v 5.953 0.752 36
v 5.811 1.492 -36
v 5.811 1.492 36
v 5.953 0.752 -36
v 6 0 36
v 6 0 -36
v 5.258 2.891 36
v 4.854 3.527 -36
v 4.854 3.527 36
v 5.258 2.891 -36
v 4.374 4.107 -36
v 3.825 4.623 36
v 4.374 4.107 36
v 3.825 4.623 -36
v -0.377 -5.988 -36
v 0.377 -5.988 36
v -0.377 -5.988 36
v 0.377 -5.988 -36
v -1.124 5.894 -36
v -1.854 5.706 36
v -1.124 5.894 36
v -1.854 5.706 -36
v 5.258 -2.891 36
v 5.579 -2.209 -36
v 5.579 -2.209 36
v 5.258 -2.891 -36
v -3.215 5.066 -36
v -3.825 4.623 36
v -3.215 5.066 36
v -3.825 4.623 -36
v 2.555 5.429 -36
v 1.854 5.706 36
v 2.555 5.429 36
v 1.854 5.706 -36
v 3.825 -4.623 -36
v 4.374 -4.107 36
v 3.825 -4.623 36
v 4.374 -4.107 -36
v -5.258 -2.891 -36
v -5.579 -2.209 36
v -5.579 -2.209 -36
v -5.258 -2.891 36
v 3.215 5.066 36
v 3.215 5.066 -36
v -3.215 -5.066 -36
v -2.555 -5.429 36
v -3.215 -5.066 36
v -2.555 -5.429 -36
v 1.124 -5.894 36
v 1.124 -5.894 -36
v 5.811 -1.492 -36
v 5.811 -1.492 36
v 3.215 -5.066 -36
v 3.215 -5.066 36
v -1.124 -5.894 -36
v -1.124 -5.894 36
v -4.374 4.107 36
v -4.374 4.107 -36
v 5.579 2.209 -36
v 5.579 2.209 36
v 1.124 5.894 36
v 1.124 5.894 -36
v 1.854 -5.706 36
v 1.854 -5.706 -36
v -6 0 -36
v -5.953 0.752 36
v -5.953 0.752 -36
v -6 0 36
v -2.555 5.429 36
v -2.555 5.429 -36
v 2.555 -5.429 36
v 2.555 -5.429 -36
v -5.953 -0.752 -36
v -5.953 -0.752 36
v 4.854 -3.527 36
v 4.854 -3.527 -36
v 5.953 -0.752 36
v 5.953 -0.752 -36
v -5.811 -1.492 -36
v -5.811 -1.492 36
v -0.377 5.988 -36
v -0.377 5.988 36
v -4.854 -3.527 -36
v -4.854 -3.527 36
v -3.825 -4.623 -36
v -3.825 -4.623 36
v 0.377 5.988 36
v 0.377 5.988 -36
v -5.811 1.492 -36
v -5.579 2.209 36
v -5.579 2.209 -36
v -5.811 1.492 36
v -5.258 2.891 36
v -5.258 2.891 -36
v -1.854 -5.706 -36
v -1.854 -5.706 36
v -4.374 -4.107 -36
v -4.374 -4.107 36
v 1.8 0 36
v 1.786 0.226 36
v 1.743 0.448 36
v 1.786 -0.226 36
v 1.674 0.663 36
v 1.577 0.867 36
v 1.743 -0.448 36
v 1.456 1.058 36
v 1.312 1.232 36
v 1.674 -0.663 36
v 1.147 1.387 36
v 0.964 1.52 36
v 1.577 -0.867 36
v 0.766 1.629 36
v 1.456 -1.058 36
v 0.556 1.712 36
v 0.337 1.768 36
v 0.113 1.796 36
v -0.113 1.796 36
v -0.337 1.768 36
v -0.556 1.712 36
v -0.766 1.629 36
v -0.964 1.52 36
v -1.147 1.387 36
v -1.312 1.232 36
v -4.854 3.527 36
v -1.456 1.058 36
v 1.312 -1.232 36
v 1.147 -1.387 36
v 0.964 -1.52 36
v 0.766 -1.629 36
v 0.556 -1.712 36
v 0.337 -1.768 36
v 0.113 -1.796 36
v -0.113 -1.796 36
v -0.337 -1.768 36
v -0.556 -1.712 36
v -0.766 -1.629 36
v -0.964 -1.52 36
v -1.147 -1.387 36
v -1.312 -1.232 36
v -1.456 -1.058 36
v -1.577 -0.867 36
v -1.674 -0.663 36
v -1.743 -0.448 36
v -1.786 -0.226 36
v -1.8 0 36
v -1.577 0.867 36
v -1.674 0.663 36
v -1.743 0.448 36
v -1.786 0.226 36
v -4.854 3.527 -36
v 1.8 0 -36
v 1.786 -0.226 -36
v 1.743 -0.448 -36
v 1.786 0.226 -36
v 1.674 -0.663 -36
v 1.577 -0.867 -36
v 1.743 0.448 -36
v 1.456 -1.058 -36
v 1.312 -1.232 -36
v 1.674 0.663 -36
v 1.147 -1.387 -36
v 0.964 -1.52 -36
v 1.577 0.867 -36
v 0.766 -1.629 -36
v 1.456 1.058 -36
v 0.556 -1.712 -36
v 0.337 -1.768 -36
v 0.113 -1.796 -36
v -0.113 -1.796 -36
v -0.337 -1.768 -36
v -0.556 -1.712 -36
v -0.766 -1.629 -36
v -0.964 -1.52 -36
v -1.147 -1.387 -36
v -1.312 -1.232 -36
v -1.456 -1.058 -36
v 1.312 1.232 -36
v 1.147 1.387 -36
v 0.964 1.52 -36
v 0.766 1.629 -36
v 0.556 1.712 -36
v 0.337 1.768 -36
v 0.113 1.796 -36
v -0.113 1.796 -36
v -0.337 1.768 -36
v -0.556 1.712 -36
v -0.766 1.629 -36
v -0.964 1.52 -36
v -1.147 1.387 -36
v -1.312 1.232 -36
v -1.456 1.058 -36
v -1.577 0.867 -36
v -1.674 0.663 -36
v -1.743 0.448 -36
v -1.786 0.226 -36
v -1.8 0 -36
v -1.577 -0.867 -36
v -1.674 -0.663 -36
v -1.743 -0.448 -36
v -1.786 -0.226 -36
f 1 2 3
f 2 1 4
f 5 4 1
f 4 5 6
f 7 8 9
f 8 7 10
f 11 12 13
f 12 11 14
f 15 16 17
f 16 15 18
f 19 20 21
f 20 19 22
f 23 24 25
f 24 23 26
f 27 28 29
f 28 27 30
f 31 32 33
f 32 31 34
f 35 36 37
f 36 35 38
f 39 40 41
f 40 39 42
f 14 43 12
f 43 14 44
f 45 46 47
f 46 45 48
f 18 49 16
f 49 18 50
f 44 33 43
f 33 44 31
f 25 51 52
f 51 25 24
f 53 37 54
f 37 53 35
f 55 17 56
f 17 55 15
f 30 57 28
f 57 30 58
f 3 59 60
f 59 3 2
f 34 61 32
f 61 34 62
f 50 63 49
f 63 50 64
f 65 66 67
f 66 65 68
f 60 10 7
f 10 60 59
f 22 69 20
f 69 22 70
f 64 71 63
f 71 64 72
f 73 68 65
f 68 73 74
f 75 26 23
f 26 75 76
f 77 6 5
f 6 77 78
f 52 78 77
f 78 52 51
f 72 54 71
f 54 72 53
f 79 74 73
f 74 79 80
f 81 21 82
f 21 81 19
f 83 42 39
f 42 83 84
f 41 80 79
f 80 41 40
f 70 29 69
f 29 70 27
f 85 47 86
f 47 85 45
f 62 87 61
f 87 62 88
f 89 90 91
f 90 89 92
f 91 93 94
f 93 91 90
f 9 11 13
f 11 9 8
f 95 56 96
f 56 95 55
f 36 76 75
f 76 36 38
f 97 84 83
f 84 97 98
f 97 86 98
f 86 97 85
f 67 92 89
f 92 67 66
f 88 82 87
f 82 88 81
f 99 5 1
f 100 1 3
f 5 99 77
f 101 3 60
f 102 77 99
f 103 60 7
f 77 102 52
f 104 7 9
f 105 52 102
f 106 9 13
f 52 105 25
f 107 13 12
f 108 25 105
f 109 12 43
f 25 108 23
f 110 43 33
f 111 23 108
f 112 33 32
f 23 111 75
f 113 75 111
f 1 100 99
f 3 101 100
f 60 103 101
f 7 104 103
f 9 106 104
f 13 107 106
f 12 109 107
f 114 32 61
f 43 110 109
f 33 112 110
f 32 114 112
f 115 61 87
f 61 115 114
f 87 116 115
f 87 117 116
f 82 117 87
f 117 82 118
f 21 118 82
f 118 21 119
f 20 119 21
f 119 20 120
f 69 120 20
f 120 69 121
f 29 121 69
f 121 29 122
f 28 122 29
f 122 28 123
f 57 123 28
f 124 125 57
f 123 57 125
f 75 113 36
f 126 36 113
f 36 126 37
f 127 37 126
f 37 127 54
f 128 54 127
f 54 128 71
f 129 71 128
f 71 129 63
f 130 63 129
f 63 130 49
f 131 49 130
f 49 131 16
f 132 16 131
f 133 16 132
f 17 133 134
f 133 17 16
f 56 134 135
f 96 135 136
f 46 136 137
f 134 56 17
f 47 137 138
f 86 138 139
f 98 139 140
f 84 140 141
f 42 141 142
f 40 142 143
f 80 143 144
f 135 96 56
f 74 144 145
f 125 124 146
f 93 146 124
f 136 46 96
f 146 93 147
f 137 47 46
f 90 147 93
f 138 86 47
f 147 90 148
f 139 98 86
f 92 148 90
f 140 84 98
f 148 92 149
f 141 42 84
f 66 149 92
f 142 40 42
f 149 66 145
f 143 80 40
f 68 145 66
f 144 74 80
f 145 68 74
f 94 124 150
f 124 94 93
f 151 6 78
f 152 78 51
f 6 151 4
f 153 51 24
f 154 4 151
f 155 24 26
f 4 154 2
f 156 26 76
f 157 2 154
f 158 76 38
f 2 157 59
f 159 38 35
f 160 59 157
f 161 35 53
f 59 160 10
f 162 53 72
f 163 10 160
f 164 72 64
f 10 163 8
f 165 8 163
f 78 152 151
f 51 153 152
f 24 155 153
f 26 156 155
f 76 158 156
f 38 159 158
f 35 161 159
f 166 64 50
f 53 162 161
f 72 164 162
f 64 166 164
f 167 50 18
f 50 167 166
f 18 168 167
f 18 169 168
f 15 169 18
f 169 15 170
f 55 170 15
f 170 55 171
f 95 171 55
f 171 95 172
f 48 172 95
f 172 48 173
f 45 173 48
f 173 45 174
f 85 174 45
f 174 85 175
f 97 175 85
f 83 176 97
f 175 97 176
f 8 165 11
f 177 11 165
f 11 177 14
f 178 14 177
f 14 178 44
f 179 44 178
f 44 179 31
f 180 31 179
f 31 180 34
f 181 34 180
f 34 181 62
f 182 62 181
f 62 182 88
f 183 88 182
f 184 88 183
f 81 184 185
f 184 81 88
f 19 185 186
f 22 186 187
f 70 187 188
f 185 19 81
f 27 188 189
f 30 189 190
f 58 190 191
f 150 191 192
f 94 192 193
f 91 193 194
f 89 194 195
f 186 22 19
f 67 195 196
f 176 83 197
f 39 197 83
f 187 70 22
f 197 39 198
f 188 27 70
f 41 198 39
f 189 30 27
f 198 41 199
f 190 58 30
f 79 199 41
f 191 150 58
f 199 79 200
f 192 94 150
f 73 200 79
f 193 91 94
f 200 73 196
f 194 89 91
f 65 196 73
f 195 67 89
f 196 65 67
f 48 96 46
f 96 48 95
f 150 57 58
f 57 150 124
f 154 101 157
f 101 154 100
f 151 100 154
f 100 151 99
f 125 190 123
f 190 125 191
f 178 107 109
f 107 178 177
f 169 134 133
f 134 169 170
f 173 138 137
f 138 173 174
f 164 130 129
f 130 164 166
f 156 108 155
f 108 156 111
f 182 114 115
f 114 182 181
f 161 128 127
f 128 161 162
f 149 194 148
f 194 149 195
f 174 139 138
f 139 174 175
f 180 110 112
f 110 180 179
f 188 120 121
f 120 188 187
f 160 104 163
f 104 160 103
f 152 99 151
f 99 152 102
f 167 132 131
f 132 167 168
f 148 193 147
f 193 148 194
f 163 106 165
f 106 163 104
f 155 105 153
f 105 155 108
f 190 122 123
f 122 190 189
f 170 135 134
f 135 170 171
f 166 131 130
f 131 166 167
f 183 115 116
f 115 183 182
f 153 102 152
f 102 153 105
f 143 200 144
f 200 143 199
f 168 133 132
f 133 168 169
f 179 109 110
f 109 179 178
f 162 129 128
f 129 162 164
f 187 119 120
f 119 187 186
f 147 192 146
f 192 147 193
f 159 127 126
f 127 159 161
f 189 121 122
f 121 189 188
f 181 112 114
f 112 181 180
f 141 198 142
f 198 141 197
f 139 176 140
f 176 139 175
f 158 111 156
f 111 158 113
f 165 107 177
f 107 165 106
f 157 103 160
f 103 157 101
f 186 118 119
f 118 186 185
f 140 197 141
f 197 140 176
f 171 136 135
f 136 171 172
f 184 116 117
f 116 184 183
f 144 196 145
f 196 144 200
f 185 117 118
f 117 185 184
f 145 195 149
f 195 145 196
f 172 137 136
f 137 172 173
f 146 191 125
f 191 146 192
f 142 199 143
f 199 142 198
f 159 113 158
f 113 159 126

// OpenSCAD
$fn = 50;


difference() {
	union() {
		translate(v = [0, 0, -36.0000000000]) {
			cylinder(h = 72, r = 6.0000000000);
		}
	}
	union() {
		#translate(v = [0, 0, -100.0000000000]) {
			cylinder(h = 200, r = 1.8000000000);
		}
	}
}
